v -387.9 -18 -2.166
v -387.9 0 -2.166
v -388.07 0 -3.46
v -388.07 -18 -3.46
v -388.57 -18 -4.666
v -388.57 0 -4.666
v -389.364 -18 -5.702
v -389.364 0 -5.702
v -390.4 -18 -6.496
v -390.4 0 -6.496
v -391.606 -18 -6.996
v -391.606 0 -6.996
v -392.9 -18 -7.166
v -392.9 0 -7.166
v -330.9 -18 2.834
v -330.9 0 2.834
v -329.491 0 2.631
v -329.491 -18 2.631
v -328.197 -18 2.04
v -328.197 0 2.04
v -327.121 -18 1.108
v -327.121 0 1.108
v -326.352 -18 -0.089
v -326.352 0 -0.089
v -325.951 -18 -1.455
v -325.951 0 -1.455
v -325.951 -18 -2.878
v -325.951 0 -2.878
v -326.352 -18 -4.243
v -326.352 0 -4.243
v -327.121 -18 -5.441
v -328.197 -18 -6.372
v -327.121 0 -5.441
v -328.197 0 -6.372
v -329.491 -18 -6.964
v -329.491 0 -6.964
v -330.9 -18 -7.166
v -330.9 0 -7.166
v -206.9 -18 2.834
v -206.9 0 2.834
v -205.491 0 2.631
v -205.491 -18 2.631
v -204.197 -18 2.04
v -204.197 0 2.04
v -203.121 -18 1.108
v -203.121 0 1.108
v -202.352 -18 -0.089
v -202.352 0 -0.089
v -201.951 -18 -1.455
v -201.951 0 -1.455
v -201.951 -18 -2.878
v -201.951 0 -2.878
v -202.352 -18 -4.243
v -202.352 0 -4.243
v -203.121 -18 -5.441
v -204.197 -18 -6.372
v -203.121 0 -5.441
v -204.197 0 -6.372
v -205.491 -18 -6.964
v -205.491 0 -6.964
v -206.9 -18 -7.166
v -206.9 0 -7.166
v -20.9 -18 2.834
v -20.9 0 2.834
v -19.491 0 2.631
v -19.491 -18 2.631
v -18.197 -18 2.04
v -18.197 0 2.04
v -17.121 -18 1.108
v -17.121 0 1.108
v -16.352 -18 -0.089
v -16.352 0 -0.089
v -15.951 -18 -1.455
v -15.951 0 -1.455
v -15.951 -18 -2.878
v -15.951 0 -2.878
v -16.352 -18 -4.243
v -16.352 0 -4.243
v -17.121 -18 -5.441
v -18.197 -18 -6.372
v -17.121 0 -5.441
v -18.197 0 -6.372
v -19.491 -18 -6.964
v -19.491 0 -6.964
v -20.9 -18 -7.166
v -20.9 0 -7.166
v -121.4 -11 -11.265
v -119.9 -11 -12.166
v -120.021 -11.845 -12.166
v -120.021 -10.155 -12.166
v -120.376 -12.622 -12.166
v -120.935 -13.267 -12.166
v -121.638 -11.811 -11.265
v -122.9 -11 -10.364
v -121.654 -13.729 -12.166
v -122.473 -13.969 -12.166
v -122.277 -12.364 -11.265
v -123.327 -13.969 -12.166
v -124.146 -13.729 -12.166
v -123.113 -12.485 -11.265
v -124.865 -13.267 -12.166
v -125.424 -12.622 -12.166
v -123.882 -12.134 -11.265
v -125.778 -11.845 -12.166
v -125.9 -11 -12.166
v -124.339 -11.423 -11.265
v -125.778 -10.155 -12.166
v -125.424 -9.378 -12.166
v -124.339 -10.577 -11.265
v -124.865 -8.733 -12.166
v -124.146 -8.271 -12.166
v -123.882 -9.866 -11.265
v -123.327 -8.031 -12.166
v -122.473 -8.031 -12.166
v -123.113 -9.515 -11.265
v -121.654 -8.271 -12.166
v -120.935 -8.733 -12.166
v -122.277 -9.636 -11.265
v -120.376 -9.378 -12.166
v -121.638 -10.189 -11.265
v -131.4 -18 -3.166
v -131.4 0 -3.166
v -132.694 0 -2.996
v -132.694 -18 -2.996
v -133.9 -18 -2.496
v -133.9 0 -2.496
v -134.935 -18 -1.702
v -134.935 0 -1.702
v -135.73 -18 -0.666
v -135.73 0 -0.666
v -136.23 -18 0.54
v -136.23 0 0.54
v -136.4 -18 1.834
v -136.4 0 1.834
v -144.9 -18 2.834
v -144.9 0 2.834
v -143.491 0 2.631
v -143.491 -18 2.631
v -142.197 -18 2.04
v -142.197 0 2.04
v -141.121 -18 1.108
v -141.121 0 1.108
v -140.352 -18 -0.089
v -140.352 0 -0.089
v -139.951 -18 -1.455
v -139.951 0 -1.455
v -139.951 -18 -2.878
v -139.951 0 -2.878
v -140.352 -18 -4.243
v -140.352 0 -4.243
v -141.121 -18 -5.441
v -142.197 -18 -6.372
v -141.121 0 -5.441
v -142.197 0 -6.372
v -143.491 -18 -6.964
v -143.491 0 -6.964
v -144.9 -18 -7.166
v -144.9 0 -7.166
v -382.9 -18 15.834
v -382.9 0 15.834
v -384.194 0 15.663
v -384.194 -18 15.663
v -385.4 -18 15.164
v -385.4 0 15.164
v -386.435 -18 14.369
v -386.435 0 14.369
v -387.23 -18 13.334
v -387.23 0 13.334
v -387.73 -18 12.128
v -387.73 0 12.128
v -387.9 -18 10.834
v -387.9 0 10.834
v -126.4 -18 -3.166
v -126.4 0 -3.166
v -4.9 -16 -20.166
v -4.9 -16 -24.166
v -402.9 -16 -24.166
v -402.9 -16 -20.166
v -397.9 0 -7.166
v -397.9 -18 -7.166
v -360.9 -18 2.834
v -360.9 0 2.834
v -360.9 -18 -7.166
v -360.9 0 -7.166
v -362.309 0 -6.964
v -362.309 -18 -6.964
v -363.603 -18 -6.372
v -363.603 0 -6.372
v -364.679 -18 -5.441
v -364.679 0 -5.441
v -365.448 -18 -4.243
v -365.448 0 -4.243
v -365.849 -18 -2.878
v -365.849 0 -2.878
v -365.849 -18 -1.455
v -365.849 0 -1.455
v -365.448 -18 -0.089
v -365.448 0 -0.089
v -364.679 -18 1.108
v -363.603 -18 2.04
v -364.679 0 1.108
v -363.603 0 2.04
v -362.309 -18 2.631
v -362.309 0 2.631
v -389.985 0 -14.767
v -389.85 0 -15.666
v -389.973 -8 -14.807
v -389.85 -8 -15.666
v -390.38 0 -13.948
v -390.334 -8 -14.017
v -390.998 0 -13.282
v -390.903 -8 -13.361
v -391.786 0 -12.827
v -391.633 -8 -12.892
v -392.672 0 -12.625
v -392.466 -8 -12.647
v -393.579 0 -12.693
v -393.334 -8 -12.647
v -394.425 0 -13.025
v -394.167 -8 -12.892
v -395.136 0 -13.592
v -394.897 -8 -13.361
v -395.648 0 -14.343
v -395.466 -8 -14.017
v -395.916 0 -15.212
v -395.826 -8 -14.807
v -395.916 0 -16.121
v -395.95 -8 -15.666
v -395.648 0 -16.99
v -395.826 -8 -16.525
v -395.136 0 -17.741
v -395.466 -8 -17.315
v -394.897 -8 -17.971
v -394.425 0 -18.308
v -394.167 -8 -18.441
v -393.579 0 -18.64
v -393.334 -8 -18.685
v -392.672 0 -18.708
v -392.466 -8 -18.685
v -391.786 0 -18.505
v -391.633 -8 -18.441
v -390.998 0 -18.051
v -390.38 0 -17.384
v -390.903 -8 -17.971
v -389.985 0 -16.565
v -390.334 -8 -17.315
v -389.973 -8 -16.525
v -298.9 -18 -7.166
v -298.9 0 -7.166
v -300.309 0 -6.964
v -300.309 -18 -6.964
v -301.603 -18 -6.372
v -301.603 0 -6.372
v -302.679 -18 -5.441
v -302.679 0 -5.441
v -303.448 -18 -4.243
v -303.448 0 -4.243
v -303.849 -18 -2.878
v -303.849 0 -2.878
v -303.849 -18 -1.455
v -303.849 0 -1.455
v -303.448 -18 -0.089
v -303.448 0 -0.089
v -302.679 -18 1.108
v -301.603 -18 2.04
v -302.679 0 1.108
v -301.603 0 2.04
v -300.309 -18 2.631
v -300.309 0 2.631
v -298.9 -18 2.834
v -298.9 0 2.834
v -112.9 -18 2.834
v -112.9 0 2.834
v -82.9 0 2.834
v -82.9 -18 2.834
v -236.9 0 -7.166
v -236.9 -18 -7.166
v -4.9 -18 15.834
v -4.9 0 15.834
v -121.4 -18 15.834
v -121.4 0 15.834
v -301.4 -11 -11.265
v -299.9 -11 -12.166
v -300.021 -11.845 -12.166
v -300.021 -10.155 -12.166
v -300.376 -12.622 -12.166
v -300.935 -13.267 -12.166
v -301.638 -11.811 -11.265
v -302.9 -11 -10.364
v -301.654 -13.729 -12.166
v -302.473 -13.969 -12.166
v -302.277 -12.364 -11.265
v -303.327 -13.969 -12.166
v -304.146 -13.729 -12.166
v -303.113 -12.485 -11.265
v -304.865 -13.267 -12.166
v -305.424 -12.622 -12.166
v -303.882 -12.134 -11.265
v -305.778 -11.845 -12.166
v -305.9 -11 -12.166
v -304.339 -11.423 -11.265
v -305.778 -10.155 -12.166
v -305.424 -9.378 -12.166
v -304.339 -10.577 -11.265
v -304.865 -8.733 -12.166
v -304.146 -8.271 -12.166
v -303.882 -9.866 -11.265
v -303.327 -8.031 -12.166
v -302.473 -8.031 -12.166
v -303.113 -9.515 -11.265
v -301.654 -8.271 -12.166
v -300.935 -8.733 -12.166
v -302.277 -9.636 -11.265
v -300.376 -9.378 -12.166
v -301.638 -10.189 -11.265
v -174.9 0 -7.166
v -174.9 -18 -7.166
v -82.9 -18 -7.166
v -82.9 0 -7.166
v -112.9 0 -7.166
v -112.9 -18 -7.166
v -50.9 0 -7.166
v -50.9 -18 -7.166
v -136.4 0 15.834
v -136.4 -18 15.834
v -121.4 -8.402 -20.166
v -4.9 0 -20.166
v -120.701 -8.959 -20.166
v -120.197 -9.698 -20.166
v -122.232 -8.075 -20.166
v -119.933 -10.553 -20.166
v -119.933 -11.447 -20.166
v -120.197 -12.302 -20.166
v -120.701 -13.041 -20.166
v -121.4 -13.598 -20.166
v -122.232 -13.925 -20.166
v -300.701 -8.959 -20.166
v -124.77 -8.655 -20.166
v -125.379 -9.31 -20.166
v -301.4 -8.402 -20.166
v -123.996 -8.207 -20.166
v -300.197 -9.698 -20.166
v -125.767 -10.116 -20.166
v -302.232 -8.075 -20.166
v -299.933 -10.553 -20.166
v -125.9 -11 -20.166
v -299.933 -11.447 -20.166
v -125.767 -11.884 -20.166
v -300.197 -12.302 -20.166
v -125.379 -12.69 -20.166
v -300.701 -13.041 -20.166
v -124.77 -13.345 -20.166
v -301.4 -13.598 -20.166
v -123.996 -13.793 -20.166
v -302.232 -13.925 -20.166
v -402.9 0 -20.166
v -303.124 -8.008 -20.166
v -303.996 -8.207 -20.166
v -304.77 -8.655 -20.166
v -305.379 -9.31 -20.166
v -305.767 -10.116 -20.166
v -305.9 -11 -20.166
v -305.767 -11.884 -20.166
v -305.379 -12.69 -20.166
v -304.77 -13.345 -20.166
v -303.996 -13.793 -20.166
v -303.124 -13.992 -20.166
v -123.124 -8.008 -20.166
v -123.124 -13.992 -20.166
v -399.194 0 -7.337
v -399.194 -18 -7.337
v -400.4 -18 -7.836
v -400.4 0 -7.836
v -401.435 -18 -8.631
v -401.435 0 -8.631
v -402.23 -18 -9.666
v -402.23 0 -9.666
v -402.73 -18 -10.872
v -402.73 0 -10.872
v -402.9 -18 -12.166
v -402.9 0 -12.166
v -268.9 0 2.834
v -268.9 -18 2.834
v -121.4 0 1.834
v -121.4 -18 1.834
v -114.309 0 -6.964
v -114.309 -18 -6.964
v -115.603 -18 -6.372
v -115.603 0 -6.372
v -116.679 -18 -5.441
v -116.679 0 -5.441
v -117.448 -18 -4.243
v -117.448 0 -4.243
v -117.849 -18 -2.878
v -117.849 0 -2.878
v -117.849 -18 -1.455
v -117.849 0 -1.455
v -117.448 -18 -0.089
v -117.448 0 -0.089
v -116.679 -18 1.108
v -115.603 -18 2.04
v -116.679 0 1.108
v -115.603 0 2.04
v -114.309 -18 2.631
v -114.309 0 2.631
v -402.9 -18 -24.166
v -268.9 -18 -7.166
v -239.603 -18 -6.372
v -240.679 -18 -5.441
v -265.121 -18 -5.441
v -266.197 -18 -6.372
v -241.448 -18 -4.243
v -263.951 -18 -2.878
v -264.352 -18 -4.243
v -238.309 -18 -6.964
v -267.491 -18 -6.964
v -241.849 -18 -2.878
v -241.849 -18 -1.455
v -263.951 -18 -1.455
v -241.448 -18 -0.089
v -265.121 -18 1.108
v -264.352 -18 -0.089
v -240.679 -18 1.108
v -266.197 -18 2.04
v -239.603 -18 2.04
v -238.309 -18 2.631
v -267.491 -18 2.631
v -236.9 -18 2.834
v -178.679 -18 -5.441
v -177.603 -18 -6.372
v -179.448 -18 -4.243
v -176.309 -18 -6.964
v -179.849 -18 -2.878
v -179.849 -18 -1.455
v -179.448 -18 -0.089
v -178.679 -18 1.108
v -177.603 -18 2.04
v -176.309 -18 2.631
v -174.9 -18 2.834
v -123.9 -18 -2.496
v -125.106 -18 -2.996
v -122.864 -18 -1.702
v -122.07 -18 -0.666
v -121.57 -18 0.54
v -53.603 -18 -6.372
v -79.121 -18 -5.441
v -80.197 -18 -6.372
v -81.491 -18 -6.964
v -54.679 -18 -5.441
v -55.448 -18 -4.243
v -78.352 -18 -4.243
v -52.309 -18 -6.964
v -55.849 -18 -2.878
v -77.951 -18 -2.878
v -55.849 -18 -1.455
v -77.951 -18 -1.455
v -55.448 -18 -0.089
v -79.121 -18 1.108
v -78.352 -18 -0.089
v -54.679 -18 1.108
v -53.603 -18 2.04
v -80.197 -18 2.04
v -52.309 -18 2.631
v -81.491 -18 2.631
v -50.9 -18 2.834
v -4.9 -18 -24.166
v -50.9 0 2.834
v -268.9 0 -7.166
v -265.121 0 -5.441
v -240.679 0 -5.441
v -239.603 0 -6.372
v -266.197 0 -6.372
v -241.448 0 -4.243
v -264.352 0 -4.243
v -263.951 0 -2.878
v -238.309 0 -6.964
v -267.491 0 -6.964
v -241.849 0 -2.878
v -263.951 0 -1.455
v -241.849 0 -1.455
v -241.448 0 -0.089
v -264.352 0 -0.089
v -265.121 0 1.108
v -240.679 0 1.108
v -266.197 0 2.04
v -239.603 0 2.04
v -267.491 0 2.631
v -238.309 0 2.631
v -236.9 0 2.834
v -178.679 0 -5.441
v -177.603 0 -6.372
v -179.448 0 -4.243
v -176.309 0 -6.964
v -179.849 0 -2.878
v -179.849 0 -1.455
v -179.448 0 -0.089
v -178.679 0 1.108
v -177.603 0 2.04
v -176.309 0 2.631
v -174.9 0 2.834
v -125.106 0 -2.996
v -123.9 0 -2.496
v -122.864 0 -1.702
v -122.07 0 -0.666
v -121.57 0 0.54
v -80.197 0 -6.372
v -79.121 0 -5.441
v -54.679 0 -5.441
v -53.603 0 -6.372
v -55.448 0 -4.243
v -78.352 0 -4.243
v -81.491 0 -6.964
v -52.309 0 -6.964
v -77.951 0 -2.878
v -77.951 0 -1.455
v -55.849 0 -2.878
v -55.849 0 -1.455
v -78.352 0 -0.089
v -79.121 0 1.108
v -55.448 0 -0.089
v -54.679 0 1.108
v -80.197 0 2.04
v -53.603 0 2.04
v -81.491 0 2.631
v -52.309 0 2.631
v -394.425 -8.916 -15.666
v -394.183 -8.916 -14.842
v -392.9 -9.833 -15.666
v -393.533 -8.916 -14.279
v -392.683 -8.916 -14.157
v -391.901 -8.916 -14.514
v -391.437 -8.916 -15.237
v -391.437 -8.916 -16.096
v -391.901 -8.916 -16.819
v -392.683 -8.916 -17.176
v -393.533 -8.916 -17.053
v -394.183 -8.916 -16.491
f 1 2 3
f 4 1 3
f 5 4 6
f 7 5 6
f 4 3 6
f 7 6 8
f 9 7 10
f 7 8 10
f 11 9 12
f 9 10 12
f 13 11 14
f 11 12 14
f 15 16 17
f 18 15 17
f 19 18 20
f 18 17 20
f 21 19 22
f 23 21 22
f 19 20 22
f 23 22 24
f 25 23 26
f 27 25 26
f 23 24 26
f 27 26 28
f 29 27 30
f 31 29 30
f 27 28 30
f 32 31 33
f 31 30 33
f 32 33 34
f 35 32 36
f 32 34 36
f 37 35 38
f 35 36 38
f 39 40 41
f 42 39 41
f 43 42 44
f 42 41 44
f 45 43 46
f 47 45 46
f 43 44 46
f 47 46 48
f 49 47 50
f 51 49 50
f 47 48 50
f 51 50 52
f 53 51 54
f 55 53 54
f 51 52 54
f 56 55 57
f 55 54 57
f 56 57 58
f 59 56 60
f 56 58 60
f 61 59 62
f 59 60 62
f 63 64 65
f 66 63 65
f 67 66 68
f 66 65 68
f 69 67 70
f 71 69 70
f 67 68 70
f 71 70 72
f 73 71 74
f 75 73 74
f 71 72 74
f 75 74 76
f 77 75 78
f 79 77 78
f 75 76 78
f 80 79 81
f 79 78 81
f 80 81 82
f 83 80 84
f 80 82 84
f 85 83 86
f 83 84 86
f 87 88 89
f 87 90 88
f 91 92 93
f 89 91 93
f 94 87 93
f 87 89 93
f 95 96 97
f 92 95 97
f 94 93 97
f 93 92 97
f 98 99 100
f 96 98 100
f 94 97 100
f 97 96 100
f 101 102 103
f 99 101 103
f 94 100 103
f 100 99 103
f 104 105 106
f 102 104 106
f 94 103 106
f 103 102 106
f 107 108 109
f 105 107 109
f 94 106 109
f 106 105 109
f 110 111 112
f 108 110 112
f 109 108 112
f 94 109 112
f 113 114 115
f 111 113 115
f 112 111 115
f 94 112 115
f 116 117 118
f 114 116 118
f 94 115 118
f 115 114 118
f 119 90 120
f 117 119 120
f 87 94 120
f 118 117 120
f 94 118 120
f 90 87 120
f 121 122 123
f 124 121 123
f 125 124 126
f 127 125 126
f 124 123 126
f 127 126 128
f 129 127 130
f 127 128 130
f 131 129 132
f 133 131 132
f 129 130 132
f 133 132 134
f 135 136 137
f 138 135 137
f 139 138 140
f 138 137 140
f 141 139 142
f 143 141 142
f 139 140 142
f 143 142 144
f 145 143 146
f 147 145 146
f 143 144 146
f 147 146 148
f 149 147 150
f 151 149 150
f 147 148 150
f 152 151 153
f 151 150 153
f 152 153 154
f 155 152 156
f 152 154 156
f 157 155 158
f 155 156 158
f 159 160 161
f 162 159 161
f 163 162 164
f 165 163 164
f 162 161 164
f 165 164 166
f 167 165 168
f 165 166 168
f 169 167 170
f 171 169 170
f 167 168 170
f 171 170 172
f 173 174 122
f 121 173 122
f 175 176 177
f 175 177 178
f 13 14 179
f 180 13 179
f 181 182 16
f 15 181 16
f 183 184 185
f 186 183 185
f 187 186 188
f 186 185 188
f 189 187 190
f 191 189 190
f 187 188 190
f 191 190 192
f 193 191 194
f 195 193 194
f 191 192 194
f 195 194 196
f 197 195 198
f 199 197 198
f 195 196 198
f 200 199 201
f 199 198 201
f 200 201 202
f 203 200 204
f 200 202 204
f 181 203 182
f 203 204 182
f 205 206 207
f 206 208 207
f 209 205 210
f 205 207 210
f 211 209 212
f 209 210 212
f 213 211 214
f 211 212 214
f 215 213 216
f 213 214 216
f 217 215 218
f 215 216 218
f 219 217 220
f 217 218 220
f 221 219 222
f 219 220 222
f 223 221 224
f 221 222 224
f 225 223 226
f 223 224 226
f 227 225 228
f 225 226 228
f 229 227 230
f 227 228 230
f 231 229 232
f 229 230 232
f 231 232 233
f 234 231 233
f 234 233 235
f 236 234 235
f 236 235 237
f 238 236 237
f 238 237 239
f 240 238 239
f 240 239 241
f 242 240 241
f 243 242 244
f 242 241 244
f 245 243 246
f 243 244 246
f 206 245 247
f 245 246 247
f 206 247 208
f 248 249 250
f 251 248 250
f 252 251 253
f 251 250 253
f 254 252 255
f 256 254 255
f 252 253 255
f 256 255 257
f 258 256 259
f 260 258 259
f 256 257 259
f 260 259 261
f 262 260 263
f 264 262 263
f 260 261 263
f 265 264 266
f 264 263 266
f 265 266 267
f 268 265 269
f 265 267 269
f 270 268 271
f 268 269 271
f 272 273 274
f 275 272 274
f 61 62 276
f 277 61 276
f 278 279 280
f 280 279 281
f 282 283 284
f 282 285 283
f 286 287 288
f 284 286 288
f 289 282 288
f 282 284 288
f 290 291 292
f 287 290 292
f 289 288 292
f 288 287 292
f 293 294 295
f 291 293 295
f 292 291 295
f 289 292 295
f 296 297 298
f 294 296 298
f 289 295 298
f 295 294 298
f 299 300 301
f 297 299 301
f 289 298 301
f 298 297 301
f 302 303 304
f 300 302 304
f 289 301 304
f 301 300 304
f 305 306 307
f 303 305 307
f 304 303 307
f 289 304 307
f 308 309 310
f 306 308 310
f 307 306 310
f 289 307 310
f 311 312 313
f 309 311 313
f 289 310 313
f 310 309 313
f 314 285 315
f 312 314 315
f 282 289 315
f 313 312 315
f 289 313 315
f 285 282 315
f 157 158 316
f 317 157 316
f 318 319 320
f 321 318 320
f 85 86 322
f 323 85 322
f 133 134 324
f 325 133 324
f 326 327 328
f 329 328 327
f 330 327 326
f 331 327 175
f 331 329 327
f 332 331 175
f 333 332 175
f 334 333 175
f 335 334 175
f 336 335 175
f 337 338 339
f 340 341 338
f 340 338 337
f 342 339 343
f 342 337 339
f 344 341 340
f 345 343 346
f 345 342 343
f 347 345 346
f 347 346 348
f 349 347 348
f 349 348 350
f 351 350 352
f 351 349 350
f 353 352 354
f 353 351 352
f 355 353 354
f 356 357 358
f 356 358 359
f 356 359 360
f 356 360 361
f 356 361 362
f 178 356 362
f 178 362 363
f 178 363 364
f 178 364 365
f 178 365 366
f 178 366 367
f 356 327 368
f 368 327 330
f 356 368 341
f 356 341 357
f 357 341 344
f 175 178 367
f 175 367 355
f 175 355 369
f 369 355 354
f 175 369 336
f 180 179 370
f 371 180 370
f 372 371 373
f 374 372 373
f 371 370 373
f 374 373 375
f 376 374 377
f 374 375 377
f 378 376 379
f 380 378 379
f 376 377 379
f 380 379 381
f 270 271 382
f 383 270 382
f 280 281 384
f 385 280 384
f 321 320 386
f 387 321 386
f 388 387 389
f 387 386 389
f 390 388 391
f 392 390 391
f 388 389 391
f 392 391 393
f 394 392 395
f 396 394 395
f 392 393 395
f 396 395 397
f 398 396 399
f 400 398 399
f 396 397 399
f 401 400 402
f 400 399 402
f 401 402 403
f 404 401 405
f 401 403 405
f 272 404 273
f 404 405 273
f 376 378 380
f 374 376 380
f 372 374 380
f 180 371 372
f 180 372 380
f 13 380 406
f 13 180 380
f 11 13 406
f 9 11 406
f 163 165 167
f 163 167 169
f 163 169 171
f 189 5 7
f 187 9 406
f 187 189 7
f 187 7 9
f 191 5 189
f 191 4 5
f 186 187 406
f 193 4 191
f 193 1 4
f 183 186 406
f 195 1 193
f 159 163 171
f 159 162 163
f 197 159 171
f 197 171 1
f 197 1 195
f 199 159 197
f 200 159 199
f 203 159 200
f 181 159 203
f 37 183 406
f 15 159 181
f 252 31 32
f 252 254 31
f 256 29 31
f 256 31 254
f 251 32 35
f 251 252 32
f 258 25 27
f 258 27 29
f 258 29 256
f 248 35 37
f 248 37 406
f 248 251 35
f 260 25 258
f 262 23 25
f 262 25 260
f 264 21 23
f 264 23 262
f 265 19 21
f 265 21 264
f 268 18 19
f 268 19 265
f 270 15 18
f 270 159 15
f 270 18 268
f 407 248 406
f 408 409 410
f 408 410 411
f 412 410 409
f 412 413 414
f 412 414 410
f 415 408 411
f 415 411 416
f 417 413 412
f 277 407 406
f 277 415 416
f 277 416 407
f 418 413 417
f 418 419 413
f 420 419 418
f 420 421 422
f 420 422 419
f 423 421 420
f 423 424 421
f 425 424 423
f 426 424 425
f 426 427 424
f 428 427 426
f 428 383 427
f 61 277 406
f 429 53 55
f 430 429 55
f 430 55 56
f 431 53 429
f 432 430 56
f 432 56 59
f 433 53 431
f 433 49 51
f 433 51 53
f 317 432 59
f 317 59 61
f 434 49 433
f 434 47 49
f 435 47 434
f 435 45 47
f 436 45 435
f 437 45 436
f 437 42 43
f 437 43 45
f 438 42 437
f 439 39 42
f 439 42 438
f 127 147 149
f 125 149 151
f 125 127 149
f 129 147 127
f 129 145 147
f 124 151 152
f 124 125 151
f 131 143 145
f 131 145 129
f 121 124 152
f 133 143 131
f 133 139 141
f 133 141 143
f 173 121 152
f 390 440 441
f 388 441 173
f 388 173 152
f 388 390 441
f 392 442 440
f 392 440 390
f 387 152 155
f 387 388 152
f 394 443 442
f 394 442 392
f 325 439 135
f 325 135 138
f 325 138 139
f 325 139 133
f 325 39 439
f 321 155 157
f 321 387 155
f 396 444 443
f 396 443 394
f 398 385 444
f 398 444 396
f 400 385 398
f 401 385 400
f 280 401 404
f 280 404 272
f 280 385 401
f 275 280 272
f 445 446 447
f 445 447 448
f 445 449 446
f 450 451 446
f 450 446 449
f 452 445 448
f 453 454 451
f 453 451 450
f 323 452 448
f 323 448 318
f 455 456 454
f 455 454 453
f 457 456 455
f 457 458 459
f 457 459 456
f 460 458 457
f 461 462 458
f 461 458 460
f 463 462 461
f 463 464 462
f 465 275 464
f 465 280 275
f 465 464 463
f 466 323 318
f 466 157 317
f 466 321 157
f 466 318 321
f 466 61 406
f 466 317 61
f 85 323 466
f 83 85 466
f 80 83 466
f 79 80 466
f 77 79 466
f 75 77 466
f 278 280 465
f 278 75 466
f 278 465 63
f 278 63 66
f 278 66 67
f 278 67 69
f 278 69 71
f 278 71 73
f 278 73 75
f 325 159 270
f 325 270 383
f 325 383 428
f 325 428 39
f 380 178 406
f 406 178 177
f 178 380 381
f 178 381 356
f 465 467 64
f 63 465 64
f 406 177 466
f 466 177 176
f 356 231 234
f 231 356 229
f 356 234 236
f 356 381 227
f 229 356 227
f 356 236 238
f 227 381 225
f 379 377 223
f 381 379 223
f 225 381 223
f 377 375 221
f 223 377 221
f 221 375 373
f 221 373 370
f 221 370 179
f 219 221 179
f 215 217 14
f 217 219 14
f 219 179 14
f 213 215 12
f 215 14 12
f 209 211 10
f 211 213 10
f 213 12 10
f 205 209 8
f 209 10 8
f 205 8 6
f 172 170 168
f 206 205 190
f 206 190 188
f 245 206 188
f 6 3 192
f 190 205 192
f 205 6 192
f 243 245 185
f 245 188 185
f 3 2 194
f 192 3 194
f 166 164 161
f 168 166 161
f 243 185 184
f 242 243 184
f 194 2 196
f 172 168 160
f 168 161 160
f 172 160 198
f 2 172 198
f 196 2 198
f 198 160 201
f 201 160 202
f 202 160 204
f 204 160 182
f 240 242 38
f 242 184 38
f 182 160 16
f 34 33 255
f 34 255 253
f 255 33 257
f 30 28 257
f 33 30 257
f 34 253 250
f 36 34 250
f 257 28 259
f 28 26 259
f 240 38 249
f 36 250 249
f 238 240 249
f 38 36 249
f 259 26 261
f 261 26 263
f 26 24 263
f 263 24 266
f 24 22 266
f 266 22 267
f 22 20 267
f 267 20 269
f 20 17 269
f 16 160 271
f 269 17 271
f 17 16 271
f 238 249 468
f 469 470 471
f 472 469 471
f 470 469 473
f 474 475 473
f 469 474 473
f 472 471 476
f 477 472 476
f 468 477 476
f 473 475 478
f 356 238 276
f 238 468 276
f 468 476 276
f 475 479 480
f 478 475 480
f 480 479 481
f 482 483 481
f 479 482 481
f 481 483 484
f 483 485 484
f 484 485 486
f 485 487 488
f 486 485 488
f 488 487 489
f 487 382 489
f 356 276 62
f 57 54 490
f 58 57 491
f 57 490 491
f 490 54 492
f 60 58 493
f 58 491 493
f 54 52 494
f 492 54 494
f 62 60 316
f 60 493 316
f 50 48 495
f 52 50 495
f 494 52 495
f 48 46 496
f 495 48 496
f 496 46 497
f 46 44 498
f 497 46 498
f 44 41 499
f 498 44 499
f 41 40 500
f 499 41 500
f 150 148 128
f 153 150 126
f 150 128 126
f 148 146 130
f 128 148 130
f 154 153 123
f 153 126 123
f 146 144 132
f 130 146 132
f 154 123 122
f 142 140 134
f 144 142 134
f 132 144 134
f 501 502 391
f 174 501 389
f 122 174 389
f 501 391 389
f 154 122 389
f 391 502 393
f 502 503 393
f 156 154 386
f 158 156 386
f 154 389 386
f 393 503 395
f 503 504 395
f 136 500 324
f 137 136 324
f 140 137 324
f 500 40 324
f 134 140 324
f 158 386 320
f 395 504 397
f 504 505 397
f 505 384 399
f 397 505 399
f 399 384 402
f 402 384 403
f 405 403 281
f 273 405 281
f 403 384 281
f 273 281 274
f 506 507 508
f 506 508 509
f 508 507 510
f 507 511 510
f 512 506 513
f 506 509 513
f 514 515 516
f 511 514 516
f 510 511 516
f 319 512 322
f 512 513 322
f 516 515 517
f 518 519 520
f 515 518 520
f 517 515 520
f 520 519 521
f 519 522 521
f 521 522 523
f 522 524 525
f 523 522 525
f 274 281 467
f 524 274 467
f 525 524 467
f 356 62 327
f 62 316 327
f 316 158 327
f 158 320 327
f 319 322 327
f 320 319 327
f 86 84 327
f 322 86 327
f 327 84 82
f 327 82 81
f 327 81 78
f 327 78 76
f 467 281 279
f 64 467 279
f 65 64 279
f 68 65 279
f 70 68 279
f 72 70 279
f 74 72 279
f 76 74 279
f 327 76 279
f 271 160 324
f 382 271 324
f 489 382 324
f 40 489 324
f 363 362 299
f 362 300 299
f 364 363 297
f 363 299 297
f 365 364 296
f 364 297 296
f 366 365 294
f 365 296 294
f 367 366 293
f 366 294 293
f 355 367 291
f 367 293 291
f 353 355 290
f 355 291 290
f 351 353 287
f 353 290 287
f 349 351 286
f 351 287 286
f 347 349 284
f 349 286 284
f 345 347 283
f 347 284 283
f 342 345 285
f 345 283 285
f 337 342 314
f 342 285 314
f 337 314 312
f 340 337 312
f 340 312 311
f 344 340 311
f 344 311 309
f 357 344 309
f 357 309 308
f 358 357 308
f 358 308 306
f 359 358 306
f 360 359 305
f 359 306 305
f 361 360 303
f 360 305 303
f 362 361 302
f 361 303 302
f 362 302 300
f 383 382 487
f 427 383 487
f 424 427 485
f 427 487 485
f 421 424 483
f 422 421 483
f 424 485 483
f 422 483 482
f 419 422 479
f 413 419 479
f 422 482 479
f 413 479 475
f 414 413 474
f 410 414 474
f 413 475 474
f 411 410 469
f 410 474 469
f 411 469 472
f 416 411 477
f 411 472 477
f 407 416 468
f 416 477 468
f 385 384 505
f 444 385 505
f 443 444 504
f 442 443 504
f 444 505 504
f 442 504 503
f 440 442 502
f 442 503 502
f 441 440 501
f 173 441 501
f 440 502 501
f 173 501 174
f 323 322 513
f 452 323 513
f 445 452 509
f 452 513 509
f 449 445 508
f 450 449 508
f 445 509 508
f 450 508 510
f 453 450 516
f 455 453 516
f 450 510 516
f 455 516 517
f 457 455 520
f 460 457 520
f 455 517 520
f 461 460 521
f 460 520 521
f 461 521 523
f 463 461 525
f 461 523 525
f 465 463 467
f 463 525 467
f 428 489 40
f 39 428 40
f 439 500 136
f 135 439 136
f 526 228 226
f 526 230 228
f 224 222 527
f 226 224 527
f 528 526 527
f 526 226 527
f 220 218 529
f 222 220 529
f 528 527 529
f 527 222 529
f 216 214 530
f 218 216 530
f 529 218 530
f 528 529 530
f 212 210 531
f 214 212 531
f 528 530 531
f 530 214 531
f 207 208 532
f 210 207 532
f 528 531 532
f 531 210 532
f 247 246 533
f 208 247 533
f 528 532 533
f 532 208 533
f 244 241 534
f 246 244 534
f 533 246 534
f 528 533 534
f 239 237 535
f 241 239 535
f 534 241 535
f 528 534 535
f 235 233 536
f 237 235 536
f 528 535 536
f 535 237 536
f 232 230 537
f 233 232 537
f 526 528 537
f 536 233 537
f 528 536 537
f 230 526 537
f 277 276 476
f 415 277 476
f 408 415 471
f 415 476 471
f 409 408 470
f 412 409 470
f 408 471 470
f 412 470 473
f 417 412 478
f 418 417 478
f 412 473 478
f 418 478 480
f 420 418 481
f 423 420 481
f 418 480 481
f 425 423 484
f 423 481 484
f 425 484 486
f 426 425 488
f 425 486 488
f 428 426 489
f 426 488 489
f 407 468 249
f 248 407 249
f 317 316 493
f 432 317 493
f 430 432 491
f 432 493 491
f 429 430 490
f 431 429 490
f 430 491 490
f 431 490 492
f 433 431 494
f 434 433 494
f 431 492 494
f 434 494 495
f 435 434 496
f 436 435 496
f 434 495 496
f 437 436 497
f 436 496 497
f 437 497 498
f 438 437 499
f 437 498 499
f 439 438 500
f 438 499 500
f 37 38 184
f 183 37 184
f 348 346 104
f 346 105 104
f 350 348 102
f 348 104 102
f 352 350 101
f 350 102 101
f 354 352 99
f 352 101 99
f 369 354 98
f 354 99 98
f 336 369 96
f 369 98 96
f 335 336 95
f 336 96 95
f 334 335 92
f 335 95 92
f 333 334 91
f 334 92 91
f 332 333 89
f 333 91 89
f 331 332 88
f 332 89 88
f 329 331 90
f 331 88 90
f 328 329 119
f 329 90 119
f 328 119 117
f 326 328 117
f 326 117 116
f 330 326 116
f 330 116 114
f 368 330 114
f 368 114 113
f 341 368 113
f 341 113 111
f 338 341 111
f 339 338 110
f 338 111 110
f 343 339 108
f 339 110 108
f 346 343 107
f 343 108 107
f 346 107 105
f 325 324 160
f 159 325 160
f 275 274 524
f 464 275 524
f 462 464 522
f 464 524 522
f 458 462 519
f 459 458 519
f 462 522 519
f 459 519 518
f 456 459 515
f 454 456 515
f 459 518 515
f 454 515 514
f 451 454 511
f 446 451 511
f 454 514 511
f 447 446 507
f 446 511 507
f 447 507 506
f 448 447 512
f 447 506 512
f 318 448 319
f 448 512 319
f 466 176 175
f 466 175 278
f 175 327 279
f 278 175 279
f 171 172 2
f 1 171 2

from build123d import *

# Parameters (mm, degrees)
F1_DEPTH = 18
F2_W     = 16
F2_H     = 4
F3_DEPTH = 400
F5_D     = 6
F5_DEPTH = 8
F5_TIP   = 1.8025818571
F7_D     = 6.1
F7_DEPTH = 8
F7_TIP   = 1.832624888


with BuildPart() as f1:
    # F0 (on Front) → F1 (new body)
    with BuildSketch(Plane.XZ):
        with BuildLine():
            ThreePointArc((-397.8999233717, -7.1662084662), (-401.4354572777, -8.6306745602), (-402.8999233717, -12.1662084662))
            Line((-402.8999233717, -12.1662084662), (-402.8999233717, -24.1662084662))
            Line((-402.8999233717, -24.1662084662), (-4.8999233717, -24.1662084662))
            Line((-4.8999233717, -24.1662084662), (-4.8999233717, 15.8337915338))
            Line((-4.8999233717, 15.8337915338), (-121.3999233717, 15.8337915338))
            Line((-121.3999233717, 15.8337915338), (-121.3999233717, 1.8337915338))
            ThreePointArc((-121.3999233717, 1.8337915338), (-122.8643894658, -1.7017423721), (-126.3999233717, -3.1662084662))
            Line((-126.3999233717, -3.1662084662), (-131.3999233717, -3.1662084662))
            ThreePointArc((-131.3999233717, -3.1662084662), (-134.9354572777, -1.7017423721), (-136.3999233717, 1.8337915338))
            Line((-136.3999233717, 1.8337915338), (-136.3999233717, 15.8337915338))
            Line((-136.3999233717, 15.8337915338), (-382.8999233717, 15.8337915338))
            ThreePointArc((-382.8999233717, 15.8337915338), (-386.4354572777, 14.3693254398), (-387.8999233717, 10.8337915338))
            Line((-387.8999233717, 10.8337915338), (-387.8999233717, -2.1662084662))
            ThreePointArc((-387.8999233717, -2.1662084662), (-389.3643894658, -5.7017423721), (-392.8999233717, -7.1662084662))
            Line((-392.8999233717, -7.1662084662), (-397.8999233717, -7.1662084662))
        make_face()
        with BuildLine():
            ThreePointArc((-330.8999233717, 2.8337915338), (-325.8999233717, -2.1662084662), (-330.8999233717, -7.1662084662))
            Line((-330.8999233717, -7.1662084662), (-360.8999233717, -7.1662084662))
            ThreePointArc((-360.8999233717, -7.1662084662), (-365.8999233717, -2.1662084662), (-360.8999233717, 2.8337915338))
            Line((-360.8999233717, 2.8337915338), (-330.8999233717, 2.8337915338))
        make_face(mode=Mode.SUBTRACT)
        with BuildLine():
            ThreePointArc((-268.8999233717, 2.8337915338), (-263.8999233717, -2.1662084662), (-268.8999233717, -7.1662084662))
            Line((-268.8999233717, -7.1662084662), (-298.8999233717, -7.1662084662))
            ThreePointArc((-298.8999233717, -7.1662084662), (-303.8999233717, -2.1662084662), (-298.8999233717, 2.8337915338))
            Line((-298.8999233717, 2.8337915338), (-268.8999233717, 2.8337915338))
        make_face(mode=Mode.SUBTRACT)
        with BuildLine():
            ThreePointArc((-206.8999233717, 2.8337915338), (-201.8999233717, -2.1662084662), (-206.8999233717, -7.1662084662))
            Line((-206.8999233717, -7.1662084662), (-236.8999233717, -7.1662084662))
            ThreePointArc((-236.8999233717, -7.1662084662), (-241.8999233717, -2.1662084662), (-236.8999233717, 2.8337915338))
            Line((-236.8999233717, 2.8337915338), (-206.8999233717, 2.8337915338))
        make_face(mode=Mode.SUBTRACT)
        with BuildLine():
            ThreePointArc((-144.8999233717, 2.8337915338), (-139.8999233717, -2.1662084662), (-144.8999233717, -7.1662084662))
            Line((-144.8999233717, -7.1662084662), (-174.8999233717, -7.1662084662))
            ThreePointArc((-174.8999233717, -7.1662084662), (-179.8999233717, -2.1662084662), (-174.8999233717, 2.8337915338))
            Line((-174.8999233717, 2.8337915338), (-144.8999233717, 2.8337915338))
        make_face(mode=Mode.SUBTRACT)
        with BuildLine():
            ThreePointArc((-82.8999233717, 2.8337915338), (-77.8999233717, -2.1662084662), (-82.8999233717, -7.1662084662))
            Line((-82.8999233717, -7.1662084662), (-112.8999233717, -7.1662084662))
            ThreePointArc((-112.8999233717, -7.1662084662), (-117.8999233717, -2.1662084662), (-112.8999233717, 2.8337915338))
            Line((-112.8999233717, 2.8337915338), (-82.8999233717, 2.8337915338))
        make_face(mode=Mode.SUBTRACT)
        with BuildLine():
            ThreePointArc((-20.8999233717, 2.8337915338), (-15.8999233717, -2.1662084662), (-20.8999233717, -7.1662084662))
            Line((-20.8999233717, -7.1662084662), (-50.8999233717, -7.1662084662))
            ThreePointArc((-50.8999233717, -7.1662084662), (-55.8999233717, -2.1662084662), (-50.8999233717, 2.8337915338))
            Line((-50.8999233717, 2.8337915338), (-20.8999233717, 2.8337915338))
        make_face(mode=Mode.SUBTRACT)
    extrude(amount=F1_DEPTH)

    # F2 (on face) → F3 (cut)
    with BuildSketch(Plane(origin=(-402.8999233717, 0, 0), x_dir=(0, -1, 0), z_dir=(-1, 0, 0))):
        with Locations((8, -22.1662084662)):
            Rectangle(F2_W, F2_H)
    extrude(amount=-F3_DEPTH, mode=Mode.SUBTRACT)

    # F5
    with Locations(Plane(origin=(0, 0, -20.1662084662), x_dir=(1, 0, 0), z_dir=(0, 0, -1))):
        with Locations((-302.8999233717, 11), (-122.8999233717, 11)):
            Hole(F5_D / 2, depth=F5_DEPTH)
            with Locations((0, 0, -(F5_DEPTH + F5_TIP / 2))):  # 118° drill point
                Cone(0, F5_D / 2, F5_TIP, mode=Mode.SUBTRACT)

    # F7
    with Locations(Plane(origin=(0, 0, 0), x_dir=(-1, 0, 0), z_dir=(0, 1, 0))):
        with Locations((392.8999233717, -15.6662084662)):
            Hole(F7_D / 2, depth=F7_DEPTH)
            with Locations((0, 0, -(F7_DEPTH + F7_TIP / 2))):  # 118° drill point
                Cone(0, F7_D / 2, F7_TIP, mode=Mode.SUBTRACT)


solid = f1.part
